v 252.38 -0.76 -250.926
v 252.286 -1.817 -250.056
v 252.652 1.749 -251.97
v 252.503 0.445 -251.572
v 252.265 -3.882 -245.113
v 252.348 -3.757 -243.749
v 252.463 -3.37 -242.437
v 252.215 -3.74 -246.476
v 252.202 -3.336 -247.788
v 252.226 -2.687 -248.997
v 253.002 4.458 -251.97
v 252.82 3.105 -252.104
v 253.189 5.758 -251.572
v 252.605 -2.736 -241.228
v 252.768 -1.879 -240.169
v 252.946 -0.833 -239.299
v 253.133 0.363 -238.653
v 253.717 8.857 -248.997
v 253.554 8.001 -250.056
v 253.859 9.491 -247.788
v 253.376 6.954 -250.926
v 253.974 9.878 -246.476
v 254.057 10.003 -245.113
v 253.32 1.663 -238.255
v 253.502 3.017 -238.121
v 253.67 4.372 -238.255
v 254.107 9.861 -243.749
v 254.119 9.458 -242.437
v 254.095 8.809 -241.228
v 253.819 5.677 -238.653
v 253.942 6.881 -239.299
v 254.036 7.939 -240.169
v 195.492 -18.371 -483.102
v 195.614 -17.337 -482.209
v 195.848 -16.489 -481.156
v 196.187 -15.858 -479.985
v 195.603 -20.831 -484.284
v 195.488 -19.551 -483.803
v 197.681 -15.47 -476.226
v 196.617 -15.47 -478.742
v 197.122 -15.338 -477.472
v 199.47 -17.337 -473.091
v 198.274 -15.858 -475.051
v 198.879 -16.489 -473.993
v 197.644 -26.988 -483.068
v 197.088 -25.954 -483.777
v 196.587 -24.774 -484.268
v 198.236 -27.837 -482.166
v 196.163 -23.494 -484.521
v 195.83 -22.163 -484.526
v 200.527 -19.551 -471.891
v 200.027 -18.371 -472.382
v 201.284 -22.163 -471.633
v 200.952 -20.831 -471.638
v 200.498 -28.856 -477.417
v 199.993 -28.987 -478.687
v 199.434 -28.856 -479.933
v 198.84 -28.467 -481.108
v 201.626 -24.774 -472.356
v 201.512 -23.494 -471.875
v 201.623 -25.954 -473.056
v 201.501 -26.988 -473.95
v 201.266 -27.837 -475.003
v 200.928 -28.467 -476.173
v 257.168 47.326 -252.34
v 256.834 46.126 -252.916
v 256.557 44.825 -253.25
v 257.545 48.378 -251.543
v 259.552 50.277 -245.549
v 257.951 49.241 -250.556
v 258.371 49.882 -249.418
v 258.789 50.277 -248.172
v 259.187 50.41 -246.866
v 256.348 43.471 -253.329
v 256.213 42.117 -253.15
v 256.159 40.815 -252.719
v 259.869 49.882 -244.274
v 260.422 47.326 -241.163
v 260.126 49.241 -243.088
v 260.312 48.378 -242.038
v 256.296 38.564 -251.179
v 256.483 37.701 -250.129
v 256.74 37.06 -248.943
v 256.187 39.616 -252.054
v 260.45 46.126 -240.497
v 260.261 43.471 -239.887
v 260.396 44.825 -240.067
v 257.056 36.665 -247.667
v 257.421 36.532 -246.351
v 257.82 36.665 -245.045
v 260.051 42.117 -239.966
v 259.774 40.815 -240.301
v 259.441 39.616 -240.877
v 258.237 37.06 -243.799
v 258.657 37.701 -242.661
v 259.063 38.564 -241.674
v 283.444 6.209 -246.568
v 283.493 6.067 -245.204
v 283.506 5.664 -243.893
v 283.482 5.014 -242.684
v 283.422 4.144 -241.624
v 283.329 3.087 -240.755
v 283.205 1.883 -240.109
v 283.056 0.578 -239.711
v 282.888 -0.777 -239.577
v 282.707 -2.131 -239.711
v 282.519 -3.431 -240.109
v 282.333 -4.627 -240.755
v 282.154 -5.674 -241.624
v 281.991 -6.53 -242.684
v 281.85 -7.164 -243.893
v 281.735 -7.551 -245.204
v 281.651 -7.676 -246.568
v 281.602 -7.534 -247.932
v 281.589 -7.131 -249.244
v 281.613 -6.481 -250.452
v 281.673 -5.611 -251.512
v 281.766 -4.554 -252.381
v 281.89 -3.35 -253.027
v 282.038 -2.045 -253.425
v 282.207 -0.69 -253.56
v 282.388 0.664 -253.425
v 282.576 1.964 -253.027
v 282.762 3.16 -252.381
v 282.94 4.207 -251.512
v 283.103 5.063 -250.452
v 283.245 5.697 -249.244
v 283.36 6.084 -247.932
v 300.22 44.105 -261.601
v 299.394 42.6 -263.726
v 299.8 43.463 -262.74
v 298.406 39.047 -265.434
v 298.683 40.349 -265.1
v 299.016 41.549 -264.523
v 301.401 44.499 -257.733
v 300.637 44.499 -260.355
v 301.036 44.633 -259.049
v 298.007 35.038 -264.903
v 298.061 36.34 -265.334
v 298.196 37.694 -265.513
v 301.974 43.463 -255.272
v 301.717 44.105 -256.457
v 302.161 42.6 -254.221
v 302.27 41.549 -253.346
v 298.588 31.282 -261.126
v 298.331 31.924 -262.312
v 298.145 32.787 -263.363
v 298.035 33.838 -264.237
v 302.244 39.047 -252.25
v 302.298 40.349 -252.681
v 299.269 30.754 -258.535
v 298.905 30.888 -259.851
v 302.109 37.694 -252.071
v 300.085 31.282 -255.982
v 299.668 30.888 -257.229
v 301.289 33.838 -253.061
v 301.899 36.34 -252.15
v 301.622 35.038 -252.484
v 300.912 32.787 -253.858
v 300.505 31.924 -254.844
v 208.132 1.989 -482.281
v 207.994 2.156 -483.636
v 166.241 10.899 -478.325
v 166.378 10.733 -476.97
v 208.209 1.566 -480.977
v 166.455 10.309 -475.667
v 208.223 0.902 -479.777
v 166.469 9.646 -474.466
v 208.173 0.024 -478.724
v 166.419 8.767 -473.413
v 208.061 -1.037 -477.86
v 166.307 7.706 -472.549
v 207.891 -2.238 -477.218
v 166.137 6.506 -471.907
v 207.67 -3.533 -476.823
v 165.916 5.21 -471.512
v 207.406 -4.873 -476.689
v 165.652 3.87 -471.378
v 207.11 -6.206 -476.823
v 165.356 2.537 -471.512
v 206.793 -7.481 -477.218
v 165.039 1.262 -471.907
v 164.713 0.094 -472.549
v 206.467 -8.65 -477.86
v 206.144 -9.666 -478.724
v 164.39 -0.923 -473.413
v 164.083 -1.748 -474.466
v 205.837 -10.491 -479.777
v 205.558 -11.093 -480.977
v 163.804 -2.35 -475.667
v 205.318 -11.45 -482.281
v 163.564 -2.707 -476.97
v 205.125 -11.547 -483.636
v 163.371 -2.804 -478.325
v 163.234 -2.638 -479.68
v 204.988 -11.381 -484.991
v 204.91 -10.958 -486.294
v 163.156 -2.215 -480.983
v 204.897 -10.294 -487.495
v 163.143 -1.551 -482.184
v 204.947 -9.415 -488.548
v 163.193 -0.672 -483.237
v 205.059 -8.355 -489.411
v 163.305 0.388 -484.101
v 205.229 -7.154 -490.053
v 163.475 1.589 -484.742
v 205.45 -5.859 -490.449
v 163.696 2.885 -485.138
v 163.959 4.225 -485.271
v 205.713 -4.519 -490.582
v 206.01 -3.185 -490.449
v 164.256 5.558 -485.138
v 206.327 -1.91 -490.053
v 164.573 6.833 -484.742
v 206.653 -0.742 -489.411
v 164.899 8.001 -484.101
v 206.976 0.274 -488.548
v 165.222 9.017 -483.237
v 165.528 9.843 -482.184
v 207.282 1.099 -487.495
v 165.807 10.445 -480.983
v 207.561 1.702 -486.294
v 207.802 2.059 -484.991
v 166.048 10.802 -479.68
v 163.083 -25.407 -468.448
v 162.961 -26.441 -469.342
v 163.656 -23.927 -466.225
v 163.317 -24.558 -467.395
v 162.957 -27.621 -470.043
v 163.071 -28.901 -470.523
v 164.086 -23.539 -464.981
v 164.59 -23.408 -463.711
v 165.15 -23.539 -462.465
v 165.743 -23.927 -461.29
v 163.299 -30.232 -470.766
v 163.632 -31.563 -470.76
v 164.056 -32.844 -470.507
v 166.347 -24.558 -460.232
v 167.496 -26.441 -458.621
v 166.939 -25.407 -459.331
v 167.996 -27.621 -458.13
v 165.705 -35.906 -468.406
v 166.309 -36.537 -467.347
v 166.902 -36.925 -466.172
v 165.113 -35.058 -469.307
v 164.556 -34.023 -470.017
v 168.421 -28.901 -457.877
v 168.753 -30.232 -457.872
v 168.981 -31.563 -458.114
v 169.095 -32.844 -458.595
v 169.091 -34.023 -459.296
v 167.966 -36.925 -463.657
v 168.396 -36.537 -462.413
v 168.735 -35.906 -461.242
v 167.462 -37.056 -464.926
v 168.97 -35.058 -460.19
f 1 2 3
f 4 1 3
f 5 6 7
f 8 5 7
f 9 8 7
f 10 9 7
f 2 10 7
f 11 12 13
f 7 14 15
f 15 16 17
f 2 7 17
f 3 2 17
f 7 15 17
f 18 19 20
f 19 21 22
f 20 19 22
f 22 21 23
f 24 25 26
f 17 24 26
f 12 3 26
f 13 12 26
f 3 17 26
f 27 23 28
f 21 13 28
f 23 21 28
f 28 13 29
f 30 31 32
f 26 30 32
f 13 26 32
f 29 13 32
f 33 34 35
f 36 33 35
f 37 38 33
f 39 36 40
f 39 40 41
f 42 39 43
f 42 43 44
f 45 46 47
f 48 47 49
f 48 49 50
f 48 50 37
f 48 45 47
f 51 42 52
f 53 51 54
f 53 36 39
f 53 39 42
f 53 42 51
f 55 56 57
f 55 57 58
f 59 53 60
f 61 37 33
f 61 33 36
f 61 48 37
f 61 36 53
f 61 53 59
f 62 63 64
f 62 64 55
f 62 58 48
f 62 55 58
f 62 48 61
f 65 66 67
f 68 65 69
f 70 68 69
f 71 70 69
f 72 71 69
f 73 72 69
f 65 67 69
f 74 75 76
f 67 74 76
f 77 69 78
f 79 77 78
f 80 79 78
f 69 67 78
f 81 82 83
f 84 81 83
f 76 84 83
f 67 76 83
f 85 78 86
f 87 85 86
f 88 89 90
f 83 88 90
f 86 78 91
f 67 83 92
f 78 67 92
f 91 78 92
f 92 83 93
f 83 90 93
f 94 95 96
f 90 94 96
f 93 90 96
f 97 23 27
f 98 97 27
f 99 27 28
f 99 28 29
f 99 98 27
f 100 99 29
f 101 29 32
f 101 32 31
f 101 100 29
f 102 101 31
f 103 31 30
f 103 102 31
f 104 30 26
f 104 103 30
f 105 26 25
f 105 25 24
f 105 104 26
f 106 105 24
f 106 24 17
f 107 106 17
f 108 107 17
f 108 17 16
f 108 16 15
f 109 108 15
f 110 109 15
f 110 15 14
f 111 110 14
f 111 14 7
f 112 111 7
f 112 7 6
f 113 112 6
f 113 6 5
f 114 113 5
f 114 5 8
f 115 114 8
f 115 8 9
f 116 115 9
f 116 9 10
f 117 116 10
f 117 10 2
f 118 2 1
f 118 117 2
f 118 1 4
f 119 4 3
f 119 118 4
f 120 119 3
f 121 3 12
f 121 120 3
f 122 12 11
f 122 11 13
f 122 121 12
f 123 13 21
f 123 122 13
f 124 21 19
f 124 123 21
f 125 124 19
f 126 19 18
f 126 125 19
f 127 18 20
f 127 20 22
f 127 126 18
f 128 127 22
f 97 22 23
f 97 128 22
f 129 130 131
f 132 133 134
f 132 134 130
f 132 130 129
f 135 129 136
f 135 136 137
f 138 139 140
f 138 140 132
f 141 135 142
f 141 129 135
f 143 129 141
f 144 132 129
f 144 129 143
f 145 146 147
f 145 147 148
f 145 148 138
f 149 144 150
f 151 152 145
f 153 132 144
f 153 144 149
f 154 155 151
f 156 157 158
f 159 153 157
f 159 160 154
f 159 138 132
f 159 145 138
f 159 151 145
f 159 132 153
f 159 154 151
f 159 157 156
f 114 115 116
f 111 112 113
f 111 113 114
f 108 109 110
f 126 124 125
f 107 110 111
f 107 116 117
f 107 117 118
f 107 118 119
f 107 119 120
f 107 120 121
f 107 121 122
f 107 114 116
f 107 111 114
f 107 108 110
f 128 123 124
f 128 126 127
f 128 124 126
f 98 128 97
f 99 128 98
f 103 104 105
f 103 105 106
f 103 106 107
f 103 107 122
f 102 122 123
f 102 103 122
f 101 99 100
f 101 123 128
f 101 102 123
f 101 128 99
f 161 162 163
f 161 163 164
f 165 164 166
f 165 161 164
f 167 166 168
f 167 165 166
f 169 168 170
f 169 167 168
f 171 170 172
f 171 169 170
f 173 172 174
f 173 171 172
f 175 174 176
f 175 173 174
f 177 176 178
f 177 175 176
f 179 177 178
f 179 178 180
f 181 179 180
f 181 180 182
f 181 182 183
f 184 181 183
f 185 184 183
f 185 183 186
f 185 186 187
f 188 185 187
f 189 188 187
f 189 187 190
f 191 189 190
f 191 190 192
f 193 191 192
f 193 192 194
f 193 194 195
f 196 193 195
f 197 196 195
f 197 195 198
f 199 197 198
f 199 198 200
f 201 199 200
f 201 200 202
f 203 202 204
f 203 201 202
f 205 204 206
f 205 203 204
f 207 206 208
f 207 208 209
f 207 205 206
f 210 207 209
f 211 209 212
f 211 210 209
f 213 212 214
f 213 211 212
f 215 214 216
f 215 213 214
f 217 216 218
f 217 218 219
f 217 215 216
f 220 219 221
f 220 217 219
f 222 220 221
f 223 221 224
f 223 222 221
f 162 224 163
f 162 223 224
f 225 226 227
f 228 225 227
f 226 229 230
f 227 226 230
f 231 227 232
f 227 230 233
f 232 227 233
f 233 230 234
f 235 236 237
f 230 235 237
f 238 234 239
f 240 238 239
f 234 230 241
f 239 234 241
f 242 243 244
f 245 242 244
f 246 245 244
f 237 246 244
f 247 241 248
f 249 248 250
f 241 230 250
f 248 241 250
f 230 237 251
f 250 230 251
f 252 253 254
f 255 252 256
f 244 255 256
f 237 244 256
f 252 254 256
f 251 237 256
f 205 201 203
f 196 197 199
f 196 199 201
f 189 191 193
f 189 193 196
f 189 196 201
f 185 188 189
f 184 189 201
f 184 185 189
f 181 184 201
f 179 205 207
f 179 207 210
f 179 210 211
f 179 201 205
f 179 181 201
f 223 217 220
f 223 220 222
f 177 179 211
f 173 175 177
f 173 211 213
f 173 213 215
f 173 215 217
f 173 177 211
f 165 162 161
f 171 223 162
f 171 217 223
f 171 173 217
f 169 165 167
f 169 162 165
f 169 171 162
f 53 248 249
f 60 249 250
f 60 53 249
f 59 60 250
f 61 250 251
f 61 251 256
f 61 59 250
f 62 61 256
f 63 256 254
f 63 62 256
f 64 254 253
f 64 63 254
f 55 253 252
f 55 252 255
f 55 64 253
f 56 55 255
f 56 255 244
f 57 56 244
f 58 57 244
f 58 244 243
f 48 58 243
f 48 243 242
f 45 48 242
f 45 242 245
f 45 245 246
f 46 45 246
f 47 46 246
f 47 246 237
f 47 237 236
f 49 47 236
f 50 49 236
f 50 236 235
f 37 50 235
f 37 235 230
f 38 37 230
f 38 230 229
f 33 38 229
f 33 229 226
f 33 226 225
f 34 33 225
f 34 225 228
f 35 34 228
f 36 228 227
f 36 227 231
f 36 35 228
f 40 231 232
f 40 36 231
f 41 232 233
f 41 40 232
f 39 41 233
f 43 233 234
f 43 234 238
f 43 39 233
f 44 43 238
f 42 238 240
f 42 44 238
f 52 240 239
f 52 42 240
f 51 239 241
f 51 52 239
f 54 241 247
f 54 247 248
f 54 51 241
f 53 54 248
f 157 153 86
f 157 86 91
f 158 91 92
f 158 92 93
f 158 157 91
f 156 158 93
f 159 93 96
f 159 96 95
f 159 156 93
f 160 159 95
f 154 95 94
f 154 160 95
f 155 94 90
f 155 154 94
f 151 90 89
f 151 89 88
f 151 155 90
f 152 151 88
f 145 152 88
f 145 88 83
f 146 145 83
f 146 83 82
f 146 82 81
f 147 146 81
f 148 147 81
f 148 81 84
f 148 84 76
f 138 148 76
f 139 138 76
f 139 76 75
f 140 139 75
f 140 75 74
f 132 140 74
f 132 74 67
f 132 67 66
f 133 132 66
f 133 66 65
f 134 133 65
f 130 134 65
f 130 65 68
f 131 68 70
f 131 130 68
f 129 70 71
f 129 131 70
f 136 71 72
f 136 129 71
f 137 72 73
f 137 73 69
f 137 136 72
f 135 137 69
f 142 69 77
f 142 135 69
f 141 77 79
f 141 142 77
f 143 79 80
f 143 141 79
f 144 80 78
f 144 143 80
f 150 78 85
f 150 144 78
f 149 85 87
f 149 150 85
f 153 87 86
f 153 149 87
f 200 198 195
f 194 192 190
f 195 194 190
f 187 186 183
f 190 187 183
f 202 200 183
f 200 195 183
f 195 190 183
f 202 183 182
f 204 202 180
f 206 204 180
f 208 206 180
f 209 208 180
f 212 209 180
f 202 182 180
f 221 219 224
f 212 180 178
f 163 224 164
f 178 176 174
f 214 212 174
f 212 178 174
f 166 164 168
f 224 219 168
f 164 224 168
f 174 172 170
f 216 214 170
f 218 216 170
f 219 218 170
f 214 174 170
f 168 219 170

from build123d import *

# Parameters (mm, degrees)
SUSP_FR_ROCKER_BRACKET_A_PROFILE_R   = 7
SUSP_FR_ROCKER_BRACKET_B_PROFILE_R   = 7
SUSP_FR_COILOVER_BRACKET_A_PROFILE_R = 7
SUSP_FR_COILOVER_BRACKET_B_PROFILE_R = 7


with BuildPart() as part:
    # SUSP_FR_rocker_bracket_a: sweep along a curve in space
    with BuildLine() as susp_fr_rocker_bracket_a_path:
        Line((258.30426, 43.4708888, -246.608444), (300.152615, 37.6935056, -258.791888))
    # SUSP_FR_rocker_bracket_a profile (on start of the path) → SUSP_FR_rocker_bracket_a (sweep)
    with BuildSketch(Plane(origin=(258.30426, 43.4708888, -246.608444), x_dir=(0.2795278895031742, 0, 0.9601375729497837), z_dir=(0.951812297367076, -0.13140264118773481, -0.27710412568147824))):
        Circle(SUSP_FR_ROCKER_BRACKET_A_PROFILE_R)
    sweep(path=susp_fr_rocker_bracket_a_path.line)


with BuildPart() as body_2:
    # SUSP_FR_rocker_bracket_b: sweep along a curve in space
    with BuildLine() as susp_fr_rocker_bracket_b_path:
        Line((253.16093, 3.06062272, -245.112504), (282.547385, -0.733505554, -246.568112))
    # SUSP_FR_rocker_bracket_b profile (on start of the path) → SUSP_FR_rocker_bracket_b (sweep)
    with BuildSketch(Plane(origin=(253.16093, 3.06062272, -245.112504), x_dir=(0.12804860626096684, 0.9917678934280055, 0), z_dir=(0.990573329465155, -0.12789437435696369, -0.04906636281770392))):
        Circle(SUSP_FR_ROCKER_BRACKET_B_PROFILE_R)
    sweep(path=susp_fr_rocker_bracket_b_path.line)


with BuildPart() as body_3:
    # SUSP_FR_coilover_bracket_a: sweep along a curve in space
    with BuildLine() as susp_fr_coilover_bracket_a_path:
        Line((164.805861, 4.04738961, -478.324842), (206.559789, -4.69578838, -483.635731))
    # SUSP_FR_coilover_bracket_a profile (on start of the path) → SUSP_FR_coilover_bracket_a (sweep)
    with BuildSketch(Plane(origin=(164.805861, 4.04738961, -478.324842), x_dir=(0.2049526189830252, 0.9787718957816468, 0), z_dir=(0.9712739650393727, -0.20338256926132248, -0.1235411484379151))):
        Circle(SUSP_FR_COILOVER_BRACKET_A_PROFILE_R)
    sweep(path=susp_fr_coilover_bracket_a_path.line)


with BuildPart() as body_4:
    # SUSP_FR_coilover_bracket_b: sweep along a curve in space
    with BuildLine() as susp_fr_coilover_bracket_b_path:
        Line((166.026177, -30.2321009, -464.318765), (198.557411, -22.1626116, -478.079469))
    # SUSP_FR_coilover_bracket_b profile (on start of the path) → SUSP_FR_coilover_bracket_b (sweep)
    with BuildSketch(Plane(origin=(166.026177, -30.2321009, -464.318765), x_dir=(0.3895797084653776, 0, 0.9209927528227524), z_dir=(0.8978602133296604, 0.22271744700368298, -0.37979464993569667))):
        Circle(SUSP_FR_COILOVER_BRACKET_B_PROFILE_R)
    sweep(path=susp_fr_coilover_bracket_b_path.line)


solid = Compound([part.part, body_2.part, body_3.part, body_4.part])
